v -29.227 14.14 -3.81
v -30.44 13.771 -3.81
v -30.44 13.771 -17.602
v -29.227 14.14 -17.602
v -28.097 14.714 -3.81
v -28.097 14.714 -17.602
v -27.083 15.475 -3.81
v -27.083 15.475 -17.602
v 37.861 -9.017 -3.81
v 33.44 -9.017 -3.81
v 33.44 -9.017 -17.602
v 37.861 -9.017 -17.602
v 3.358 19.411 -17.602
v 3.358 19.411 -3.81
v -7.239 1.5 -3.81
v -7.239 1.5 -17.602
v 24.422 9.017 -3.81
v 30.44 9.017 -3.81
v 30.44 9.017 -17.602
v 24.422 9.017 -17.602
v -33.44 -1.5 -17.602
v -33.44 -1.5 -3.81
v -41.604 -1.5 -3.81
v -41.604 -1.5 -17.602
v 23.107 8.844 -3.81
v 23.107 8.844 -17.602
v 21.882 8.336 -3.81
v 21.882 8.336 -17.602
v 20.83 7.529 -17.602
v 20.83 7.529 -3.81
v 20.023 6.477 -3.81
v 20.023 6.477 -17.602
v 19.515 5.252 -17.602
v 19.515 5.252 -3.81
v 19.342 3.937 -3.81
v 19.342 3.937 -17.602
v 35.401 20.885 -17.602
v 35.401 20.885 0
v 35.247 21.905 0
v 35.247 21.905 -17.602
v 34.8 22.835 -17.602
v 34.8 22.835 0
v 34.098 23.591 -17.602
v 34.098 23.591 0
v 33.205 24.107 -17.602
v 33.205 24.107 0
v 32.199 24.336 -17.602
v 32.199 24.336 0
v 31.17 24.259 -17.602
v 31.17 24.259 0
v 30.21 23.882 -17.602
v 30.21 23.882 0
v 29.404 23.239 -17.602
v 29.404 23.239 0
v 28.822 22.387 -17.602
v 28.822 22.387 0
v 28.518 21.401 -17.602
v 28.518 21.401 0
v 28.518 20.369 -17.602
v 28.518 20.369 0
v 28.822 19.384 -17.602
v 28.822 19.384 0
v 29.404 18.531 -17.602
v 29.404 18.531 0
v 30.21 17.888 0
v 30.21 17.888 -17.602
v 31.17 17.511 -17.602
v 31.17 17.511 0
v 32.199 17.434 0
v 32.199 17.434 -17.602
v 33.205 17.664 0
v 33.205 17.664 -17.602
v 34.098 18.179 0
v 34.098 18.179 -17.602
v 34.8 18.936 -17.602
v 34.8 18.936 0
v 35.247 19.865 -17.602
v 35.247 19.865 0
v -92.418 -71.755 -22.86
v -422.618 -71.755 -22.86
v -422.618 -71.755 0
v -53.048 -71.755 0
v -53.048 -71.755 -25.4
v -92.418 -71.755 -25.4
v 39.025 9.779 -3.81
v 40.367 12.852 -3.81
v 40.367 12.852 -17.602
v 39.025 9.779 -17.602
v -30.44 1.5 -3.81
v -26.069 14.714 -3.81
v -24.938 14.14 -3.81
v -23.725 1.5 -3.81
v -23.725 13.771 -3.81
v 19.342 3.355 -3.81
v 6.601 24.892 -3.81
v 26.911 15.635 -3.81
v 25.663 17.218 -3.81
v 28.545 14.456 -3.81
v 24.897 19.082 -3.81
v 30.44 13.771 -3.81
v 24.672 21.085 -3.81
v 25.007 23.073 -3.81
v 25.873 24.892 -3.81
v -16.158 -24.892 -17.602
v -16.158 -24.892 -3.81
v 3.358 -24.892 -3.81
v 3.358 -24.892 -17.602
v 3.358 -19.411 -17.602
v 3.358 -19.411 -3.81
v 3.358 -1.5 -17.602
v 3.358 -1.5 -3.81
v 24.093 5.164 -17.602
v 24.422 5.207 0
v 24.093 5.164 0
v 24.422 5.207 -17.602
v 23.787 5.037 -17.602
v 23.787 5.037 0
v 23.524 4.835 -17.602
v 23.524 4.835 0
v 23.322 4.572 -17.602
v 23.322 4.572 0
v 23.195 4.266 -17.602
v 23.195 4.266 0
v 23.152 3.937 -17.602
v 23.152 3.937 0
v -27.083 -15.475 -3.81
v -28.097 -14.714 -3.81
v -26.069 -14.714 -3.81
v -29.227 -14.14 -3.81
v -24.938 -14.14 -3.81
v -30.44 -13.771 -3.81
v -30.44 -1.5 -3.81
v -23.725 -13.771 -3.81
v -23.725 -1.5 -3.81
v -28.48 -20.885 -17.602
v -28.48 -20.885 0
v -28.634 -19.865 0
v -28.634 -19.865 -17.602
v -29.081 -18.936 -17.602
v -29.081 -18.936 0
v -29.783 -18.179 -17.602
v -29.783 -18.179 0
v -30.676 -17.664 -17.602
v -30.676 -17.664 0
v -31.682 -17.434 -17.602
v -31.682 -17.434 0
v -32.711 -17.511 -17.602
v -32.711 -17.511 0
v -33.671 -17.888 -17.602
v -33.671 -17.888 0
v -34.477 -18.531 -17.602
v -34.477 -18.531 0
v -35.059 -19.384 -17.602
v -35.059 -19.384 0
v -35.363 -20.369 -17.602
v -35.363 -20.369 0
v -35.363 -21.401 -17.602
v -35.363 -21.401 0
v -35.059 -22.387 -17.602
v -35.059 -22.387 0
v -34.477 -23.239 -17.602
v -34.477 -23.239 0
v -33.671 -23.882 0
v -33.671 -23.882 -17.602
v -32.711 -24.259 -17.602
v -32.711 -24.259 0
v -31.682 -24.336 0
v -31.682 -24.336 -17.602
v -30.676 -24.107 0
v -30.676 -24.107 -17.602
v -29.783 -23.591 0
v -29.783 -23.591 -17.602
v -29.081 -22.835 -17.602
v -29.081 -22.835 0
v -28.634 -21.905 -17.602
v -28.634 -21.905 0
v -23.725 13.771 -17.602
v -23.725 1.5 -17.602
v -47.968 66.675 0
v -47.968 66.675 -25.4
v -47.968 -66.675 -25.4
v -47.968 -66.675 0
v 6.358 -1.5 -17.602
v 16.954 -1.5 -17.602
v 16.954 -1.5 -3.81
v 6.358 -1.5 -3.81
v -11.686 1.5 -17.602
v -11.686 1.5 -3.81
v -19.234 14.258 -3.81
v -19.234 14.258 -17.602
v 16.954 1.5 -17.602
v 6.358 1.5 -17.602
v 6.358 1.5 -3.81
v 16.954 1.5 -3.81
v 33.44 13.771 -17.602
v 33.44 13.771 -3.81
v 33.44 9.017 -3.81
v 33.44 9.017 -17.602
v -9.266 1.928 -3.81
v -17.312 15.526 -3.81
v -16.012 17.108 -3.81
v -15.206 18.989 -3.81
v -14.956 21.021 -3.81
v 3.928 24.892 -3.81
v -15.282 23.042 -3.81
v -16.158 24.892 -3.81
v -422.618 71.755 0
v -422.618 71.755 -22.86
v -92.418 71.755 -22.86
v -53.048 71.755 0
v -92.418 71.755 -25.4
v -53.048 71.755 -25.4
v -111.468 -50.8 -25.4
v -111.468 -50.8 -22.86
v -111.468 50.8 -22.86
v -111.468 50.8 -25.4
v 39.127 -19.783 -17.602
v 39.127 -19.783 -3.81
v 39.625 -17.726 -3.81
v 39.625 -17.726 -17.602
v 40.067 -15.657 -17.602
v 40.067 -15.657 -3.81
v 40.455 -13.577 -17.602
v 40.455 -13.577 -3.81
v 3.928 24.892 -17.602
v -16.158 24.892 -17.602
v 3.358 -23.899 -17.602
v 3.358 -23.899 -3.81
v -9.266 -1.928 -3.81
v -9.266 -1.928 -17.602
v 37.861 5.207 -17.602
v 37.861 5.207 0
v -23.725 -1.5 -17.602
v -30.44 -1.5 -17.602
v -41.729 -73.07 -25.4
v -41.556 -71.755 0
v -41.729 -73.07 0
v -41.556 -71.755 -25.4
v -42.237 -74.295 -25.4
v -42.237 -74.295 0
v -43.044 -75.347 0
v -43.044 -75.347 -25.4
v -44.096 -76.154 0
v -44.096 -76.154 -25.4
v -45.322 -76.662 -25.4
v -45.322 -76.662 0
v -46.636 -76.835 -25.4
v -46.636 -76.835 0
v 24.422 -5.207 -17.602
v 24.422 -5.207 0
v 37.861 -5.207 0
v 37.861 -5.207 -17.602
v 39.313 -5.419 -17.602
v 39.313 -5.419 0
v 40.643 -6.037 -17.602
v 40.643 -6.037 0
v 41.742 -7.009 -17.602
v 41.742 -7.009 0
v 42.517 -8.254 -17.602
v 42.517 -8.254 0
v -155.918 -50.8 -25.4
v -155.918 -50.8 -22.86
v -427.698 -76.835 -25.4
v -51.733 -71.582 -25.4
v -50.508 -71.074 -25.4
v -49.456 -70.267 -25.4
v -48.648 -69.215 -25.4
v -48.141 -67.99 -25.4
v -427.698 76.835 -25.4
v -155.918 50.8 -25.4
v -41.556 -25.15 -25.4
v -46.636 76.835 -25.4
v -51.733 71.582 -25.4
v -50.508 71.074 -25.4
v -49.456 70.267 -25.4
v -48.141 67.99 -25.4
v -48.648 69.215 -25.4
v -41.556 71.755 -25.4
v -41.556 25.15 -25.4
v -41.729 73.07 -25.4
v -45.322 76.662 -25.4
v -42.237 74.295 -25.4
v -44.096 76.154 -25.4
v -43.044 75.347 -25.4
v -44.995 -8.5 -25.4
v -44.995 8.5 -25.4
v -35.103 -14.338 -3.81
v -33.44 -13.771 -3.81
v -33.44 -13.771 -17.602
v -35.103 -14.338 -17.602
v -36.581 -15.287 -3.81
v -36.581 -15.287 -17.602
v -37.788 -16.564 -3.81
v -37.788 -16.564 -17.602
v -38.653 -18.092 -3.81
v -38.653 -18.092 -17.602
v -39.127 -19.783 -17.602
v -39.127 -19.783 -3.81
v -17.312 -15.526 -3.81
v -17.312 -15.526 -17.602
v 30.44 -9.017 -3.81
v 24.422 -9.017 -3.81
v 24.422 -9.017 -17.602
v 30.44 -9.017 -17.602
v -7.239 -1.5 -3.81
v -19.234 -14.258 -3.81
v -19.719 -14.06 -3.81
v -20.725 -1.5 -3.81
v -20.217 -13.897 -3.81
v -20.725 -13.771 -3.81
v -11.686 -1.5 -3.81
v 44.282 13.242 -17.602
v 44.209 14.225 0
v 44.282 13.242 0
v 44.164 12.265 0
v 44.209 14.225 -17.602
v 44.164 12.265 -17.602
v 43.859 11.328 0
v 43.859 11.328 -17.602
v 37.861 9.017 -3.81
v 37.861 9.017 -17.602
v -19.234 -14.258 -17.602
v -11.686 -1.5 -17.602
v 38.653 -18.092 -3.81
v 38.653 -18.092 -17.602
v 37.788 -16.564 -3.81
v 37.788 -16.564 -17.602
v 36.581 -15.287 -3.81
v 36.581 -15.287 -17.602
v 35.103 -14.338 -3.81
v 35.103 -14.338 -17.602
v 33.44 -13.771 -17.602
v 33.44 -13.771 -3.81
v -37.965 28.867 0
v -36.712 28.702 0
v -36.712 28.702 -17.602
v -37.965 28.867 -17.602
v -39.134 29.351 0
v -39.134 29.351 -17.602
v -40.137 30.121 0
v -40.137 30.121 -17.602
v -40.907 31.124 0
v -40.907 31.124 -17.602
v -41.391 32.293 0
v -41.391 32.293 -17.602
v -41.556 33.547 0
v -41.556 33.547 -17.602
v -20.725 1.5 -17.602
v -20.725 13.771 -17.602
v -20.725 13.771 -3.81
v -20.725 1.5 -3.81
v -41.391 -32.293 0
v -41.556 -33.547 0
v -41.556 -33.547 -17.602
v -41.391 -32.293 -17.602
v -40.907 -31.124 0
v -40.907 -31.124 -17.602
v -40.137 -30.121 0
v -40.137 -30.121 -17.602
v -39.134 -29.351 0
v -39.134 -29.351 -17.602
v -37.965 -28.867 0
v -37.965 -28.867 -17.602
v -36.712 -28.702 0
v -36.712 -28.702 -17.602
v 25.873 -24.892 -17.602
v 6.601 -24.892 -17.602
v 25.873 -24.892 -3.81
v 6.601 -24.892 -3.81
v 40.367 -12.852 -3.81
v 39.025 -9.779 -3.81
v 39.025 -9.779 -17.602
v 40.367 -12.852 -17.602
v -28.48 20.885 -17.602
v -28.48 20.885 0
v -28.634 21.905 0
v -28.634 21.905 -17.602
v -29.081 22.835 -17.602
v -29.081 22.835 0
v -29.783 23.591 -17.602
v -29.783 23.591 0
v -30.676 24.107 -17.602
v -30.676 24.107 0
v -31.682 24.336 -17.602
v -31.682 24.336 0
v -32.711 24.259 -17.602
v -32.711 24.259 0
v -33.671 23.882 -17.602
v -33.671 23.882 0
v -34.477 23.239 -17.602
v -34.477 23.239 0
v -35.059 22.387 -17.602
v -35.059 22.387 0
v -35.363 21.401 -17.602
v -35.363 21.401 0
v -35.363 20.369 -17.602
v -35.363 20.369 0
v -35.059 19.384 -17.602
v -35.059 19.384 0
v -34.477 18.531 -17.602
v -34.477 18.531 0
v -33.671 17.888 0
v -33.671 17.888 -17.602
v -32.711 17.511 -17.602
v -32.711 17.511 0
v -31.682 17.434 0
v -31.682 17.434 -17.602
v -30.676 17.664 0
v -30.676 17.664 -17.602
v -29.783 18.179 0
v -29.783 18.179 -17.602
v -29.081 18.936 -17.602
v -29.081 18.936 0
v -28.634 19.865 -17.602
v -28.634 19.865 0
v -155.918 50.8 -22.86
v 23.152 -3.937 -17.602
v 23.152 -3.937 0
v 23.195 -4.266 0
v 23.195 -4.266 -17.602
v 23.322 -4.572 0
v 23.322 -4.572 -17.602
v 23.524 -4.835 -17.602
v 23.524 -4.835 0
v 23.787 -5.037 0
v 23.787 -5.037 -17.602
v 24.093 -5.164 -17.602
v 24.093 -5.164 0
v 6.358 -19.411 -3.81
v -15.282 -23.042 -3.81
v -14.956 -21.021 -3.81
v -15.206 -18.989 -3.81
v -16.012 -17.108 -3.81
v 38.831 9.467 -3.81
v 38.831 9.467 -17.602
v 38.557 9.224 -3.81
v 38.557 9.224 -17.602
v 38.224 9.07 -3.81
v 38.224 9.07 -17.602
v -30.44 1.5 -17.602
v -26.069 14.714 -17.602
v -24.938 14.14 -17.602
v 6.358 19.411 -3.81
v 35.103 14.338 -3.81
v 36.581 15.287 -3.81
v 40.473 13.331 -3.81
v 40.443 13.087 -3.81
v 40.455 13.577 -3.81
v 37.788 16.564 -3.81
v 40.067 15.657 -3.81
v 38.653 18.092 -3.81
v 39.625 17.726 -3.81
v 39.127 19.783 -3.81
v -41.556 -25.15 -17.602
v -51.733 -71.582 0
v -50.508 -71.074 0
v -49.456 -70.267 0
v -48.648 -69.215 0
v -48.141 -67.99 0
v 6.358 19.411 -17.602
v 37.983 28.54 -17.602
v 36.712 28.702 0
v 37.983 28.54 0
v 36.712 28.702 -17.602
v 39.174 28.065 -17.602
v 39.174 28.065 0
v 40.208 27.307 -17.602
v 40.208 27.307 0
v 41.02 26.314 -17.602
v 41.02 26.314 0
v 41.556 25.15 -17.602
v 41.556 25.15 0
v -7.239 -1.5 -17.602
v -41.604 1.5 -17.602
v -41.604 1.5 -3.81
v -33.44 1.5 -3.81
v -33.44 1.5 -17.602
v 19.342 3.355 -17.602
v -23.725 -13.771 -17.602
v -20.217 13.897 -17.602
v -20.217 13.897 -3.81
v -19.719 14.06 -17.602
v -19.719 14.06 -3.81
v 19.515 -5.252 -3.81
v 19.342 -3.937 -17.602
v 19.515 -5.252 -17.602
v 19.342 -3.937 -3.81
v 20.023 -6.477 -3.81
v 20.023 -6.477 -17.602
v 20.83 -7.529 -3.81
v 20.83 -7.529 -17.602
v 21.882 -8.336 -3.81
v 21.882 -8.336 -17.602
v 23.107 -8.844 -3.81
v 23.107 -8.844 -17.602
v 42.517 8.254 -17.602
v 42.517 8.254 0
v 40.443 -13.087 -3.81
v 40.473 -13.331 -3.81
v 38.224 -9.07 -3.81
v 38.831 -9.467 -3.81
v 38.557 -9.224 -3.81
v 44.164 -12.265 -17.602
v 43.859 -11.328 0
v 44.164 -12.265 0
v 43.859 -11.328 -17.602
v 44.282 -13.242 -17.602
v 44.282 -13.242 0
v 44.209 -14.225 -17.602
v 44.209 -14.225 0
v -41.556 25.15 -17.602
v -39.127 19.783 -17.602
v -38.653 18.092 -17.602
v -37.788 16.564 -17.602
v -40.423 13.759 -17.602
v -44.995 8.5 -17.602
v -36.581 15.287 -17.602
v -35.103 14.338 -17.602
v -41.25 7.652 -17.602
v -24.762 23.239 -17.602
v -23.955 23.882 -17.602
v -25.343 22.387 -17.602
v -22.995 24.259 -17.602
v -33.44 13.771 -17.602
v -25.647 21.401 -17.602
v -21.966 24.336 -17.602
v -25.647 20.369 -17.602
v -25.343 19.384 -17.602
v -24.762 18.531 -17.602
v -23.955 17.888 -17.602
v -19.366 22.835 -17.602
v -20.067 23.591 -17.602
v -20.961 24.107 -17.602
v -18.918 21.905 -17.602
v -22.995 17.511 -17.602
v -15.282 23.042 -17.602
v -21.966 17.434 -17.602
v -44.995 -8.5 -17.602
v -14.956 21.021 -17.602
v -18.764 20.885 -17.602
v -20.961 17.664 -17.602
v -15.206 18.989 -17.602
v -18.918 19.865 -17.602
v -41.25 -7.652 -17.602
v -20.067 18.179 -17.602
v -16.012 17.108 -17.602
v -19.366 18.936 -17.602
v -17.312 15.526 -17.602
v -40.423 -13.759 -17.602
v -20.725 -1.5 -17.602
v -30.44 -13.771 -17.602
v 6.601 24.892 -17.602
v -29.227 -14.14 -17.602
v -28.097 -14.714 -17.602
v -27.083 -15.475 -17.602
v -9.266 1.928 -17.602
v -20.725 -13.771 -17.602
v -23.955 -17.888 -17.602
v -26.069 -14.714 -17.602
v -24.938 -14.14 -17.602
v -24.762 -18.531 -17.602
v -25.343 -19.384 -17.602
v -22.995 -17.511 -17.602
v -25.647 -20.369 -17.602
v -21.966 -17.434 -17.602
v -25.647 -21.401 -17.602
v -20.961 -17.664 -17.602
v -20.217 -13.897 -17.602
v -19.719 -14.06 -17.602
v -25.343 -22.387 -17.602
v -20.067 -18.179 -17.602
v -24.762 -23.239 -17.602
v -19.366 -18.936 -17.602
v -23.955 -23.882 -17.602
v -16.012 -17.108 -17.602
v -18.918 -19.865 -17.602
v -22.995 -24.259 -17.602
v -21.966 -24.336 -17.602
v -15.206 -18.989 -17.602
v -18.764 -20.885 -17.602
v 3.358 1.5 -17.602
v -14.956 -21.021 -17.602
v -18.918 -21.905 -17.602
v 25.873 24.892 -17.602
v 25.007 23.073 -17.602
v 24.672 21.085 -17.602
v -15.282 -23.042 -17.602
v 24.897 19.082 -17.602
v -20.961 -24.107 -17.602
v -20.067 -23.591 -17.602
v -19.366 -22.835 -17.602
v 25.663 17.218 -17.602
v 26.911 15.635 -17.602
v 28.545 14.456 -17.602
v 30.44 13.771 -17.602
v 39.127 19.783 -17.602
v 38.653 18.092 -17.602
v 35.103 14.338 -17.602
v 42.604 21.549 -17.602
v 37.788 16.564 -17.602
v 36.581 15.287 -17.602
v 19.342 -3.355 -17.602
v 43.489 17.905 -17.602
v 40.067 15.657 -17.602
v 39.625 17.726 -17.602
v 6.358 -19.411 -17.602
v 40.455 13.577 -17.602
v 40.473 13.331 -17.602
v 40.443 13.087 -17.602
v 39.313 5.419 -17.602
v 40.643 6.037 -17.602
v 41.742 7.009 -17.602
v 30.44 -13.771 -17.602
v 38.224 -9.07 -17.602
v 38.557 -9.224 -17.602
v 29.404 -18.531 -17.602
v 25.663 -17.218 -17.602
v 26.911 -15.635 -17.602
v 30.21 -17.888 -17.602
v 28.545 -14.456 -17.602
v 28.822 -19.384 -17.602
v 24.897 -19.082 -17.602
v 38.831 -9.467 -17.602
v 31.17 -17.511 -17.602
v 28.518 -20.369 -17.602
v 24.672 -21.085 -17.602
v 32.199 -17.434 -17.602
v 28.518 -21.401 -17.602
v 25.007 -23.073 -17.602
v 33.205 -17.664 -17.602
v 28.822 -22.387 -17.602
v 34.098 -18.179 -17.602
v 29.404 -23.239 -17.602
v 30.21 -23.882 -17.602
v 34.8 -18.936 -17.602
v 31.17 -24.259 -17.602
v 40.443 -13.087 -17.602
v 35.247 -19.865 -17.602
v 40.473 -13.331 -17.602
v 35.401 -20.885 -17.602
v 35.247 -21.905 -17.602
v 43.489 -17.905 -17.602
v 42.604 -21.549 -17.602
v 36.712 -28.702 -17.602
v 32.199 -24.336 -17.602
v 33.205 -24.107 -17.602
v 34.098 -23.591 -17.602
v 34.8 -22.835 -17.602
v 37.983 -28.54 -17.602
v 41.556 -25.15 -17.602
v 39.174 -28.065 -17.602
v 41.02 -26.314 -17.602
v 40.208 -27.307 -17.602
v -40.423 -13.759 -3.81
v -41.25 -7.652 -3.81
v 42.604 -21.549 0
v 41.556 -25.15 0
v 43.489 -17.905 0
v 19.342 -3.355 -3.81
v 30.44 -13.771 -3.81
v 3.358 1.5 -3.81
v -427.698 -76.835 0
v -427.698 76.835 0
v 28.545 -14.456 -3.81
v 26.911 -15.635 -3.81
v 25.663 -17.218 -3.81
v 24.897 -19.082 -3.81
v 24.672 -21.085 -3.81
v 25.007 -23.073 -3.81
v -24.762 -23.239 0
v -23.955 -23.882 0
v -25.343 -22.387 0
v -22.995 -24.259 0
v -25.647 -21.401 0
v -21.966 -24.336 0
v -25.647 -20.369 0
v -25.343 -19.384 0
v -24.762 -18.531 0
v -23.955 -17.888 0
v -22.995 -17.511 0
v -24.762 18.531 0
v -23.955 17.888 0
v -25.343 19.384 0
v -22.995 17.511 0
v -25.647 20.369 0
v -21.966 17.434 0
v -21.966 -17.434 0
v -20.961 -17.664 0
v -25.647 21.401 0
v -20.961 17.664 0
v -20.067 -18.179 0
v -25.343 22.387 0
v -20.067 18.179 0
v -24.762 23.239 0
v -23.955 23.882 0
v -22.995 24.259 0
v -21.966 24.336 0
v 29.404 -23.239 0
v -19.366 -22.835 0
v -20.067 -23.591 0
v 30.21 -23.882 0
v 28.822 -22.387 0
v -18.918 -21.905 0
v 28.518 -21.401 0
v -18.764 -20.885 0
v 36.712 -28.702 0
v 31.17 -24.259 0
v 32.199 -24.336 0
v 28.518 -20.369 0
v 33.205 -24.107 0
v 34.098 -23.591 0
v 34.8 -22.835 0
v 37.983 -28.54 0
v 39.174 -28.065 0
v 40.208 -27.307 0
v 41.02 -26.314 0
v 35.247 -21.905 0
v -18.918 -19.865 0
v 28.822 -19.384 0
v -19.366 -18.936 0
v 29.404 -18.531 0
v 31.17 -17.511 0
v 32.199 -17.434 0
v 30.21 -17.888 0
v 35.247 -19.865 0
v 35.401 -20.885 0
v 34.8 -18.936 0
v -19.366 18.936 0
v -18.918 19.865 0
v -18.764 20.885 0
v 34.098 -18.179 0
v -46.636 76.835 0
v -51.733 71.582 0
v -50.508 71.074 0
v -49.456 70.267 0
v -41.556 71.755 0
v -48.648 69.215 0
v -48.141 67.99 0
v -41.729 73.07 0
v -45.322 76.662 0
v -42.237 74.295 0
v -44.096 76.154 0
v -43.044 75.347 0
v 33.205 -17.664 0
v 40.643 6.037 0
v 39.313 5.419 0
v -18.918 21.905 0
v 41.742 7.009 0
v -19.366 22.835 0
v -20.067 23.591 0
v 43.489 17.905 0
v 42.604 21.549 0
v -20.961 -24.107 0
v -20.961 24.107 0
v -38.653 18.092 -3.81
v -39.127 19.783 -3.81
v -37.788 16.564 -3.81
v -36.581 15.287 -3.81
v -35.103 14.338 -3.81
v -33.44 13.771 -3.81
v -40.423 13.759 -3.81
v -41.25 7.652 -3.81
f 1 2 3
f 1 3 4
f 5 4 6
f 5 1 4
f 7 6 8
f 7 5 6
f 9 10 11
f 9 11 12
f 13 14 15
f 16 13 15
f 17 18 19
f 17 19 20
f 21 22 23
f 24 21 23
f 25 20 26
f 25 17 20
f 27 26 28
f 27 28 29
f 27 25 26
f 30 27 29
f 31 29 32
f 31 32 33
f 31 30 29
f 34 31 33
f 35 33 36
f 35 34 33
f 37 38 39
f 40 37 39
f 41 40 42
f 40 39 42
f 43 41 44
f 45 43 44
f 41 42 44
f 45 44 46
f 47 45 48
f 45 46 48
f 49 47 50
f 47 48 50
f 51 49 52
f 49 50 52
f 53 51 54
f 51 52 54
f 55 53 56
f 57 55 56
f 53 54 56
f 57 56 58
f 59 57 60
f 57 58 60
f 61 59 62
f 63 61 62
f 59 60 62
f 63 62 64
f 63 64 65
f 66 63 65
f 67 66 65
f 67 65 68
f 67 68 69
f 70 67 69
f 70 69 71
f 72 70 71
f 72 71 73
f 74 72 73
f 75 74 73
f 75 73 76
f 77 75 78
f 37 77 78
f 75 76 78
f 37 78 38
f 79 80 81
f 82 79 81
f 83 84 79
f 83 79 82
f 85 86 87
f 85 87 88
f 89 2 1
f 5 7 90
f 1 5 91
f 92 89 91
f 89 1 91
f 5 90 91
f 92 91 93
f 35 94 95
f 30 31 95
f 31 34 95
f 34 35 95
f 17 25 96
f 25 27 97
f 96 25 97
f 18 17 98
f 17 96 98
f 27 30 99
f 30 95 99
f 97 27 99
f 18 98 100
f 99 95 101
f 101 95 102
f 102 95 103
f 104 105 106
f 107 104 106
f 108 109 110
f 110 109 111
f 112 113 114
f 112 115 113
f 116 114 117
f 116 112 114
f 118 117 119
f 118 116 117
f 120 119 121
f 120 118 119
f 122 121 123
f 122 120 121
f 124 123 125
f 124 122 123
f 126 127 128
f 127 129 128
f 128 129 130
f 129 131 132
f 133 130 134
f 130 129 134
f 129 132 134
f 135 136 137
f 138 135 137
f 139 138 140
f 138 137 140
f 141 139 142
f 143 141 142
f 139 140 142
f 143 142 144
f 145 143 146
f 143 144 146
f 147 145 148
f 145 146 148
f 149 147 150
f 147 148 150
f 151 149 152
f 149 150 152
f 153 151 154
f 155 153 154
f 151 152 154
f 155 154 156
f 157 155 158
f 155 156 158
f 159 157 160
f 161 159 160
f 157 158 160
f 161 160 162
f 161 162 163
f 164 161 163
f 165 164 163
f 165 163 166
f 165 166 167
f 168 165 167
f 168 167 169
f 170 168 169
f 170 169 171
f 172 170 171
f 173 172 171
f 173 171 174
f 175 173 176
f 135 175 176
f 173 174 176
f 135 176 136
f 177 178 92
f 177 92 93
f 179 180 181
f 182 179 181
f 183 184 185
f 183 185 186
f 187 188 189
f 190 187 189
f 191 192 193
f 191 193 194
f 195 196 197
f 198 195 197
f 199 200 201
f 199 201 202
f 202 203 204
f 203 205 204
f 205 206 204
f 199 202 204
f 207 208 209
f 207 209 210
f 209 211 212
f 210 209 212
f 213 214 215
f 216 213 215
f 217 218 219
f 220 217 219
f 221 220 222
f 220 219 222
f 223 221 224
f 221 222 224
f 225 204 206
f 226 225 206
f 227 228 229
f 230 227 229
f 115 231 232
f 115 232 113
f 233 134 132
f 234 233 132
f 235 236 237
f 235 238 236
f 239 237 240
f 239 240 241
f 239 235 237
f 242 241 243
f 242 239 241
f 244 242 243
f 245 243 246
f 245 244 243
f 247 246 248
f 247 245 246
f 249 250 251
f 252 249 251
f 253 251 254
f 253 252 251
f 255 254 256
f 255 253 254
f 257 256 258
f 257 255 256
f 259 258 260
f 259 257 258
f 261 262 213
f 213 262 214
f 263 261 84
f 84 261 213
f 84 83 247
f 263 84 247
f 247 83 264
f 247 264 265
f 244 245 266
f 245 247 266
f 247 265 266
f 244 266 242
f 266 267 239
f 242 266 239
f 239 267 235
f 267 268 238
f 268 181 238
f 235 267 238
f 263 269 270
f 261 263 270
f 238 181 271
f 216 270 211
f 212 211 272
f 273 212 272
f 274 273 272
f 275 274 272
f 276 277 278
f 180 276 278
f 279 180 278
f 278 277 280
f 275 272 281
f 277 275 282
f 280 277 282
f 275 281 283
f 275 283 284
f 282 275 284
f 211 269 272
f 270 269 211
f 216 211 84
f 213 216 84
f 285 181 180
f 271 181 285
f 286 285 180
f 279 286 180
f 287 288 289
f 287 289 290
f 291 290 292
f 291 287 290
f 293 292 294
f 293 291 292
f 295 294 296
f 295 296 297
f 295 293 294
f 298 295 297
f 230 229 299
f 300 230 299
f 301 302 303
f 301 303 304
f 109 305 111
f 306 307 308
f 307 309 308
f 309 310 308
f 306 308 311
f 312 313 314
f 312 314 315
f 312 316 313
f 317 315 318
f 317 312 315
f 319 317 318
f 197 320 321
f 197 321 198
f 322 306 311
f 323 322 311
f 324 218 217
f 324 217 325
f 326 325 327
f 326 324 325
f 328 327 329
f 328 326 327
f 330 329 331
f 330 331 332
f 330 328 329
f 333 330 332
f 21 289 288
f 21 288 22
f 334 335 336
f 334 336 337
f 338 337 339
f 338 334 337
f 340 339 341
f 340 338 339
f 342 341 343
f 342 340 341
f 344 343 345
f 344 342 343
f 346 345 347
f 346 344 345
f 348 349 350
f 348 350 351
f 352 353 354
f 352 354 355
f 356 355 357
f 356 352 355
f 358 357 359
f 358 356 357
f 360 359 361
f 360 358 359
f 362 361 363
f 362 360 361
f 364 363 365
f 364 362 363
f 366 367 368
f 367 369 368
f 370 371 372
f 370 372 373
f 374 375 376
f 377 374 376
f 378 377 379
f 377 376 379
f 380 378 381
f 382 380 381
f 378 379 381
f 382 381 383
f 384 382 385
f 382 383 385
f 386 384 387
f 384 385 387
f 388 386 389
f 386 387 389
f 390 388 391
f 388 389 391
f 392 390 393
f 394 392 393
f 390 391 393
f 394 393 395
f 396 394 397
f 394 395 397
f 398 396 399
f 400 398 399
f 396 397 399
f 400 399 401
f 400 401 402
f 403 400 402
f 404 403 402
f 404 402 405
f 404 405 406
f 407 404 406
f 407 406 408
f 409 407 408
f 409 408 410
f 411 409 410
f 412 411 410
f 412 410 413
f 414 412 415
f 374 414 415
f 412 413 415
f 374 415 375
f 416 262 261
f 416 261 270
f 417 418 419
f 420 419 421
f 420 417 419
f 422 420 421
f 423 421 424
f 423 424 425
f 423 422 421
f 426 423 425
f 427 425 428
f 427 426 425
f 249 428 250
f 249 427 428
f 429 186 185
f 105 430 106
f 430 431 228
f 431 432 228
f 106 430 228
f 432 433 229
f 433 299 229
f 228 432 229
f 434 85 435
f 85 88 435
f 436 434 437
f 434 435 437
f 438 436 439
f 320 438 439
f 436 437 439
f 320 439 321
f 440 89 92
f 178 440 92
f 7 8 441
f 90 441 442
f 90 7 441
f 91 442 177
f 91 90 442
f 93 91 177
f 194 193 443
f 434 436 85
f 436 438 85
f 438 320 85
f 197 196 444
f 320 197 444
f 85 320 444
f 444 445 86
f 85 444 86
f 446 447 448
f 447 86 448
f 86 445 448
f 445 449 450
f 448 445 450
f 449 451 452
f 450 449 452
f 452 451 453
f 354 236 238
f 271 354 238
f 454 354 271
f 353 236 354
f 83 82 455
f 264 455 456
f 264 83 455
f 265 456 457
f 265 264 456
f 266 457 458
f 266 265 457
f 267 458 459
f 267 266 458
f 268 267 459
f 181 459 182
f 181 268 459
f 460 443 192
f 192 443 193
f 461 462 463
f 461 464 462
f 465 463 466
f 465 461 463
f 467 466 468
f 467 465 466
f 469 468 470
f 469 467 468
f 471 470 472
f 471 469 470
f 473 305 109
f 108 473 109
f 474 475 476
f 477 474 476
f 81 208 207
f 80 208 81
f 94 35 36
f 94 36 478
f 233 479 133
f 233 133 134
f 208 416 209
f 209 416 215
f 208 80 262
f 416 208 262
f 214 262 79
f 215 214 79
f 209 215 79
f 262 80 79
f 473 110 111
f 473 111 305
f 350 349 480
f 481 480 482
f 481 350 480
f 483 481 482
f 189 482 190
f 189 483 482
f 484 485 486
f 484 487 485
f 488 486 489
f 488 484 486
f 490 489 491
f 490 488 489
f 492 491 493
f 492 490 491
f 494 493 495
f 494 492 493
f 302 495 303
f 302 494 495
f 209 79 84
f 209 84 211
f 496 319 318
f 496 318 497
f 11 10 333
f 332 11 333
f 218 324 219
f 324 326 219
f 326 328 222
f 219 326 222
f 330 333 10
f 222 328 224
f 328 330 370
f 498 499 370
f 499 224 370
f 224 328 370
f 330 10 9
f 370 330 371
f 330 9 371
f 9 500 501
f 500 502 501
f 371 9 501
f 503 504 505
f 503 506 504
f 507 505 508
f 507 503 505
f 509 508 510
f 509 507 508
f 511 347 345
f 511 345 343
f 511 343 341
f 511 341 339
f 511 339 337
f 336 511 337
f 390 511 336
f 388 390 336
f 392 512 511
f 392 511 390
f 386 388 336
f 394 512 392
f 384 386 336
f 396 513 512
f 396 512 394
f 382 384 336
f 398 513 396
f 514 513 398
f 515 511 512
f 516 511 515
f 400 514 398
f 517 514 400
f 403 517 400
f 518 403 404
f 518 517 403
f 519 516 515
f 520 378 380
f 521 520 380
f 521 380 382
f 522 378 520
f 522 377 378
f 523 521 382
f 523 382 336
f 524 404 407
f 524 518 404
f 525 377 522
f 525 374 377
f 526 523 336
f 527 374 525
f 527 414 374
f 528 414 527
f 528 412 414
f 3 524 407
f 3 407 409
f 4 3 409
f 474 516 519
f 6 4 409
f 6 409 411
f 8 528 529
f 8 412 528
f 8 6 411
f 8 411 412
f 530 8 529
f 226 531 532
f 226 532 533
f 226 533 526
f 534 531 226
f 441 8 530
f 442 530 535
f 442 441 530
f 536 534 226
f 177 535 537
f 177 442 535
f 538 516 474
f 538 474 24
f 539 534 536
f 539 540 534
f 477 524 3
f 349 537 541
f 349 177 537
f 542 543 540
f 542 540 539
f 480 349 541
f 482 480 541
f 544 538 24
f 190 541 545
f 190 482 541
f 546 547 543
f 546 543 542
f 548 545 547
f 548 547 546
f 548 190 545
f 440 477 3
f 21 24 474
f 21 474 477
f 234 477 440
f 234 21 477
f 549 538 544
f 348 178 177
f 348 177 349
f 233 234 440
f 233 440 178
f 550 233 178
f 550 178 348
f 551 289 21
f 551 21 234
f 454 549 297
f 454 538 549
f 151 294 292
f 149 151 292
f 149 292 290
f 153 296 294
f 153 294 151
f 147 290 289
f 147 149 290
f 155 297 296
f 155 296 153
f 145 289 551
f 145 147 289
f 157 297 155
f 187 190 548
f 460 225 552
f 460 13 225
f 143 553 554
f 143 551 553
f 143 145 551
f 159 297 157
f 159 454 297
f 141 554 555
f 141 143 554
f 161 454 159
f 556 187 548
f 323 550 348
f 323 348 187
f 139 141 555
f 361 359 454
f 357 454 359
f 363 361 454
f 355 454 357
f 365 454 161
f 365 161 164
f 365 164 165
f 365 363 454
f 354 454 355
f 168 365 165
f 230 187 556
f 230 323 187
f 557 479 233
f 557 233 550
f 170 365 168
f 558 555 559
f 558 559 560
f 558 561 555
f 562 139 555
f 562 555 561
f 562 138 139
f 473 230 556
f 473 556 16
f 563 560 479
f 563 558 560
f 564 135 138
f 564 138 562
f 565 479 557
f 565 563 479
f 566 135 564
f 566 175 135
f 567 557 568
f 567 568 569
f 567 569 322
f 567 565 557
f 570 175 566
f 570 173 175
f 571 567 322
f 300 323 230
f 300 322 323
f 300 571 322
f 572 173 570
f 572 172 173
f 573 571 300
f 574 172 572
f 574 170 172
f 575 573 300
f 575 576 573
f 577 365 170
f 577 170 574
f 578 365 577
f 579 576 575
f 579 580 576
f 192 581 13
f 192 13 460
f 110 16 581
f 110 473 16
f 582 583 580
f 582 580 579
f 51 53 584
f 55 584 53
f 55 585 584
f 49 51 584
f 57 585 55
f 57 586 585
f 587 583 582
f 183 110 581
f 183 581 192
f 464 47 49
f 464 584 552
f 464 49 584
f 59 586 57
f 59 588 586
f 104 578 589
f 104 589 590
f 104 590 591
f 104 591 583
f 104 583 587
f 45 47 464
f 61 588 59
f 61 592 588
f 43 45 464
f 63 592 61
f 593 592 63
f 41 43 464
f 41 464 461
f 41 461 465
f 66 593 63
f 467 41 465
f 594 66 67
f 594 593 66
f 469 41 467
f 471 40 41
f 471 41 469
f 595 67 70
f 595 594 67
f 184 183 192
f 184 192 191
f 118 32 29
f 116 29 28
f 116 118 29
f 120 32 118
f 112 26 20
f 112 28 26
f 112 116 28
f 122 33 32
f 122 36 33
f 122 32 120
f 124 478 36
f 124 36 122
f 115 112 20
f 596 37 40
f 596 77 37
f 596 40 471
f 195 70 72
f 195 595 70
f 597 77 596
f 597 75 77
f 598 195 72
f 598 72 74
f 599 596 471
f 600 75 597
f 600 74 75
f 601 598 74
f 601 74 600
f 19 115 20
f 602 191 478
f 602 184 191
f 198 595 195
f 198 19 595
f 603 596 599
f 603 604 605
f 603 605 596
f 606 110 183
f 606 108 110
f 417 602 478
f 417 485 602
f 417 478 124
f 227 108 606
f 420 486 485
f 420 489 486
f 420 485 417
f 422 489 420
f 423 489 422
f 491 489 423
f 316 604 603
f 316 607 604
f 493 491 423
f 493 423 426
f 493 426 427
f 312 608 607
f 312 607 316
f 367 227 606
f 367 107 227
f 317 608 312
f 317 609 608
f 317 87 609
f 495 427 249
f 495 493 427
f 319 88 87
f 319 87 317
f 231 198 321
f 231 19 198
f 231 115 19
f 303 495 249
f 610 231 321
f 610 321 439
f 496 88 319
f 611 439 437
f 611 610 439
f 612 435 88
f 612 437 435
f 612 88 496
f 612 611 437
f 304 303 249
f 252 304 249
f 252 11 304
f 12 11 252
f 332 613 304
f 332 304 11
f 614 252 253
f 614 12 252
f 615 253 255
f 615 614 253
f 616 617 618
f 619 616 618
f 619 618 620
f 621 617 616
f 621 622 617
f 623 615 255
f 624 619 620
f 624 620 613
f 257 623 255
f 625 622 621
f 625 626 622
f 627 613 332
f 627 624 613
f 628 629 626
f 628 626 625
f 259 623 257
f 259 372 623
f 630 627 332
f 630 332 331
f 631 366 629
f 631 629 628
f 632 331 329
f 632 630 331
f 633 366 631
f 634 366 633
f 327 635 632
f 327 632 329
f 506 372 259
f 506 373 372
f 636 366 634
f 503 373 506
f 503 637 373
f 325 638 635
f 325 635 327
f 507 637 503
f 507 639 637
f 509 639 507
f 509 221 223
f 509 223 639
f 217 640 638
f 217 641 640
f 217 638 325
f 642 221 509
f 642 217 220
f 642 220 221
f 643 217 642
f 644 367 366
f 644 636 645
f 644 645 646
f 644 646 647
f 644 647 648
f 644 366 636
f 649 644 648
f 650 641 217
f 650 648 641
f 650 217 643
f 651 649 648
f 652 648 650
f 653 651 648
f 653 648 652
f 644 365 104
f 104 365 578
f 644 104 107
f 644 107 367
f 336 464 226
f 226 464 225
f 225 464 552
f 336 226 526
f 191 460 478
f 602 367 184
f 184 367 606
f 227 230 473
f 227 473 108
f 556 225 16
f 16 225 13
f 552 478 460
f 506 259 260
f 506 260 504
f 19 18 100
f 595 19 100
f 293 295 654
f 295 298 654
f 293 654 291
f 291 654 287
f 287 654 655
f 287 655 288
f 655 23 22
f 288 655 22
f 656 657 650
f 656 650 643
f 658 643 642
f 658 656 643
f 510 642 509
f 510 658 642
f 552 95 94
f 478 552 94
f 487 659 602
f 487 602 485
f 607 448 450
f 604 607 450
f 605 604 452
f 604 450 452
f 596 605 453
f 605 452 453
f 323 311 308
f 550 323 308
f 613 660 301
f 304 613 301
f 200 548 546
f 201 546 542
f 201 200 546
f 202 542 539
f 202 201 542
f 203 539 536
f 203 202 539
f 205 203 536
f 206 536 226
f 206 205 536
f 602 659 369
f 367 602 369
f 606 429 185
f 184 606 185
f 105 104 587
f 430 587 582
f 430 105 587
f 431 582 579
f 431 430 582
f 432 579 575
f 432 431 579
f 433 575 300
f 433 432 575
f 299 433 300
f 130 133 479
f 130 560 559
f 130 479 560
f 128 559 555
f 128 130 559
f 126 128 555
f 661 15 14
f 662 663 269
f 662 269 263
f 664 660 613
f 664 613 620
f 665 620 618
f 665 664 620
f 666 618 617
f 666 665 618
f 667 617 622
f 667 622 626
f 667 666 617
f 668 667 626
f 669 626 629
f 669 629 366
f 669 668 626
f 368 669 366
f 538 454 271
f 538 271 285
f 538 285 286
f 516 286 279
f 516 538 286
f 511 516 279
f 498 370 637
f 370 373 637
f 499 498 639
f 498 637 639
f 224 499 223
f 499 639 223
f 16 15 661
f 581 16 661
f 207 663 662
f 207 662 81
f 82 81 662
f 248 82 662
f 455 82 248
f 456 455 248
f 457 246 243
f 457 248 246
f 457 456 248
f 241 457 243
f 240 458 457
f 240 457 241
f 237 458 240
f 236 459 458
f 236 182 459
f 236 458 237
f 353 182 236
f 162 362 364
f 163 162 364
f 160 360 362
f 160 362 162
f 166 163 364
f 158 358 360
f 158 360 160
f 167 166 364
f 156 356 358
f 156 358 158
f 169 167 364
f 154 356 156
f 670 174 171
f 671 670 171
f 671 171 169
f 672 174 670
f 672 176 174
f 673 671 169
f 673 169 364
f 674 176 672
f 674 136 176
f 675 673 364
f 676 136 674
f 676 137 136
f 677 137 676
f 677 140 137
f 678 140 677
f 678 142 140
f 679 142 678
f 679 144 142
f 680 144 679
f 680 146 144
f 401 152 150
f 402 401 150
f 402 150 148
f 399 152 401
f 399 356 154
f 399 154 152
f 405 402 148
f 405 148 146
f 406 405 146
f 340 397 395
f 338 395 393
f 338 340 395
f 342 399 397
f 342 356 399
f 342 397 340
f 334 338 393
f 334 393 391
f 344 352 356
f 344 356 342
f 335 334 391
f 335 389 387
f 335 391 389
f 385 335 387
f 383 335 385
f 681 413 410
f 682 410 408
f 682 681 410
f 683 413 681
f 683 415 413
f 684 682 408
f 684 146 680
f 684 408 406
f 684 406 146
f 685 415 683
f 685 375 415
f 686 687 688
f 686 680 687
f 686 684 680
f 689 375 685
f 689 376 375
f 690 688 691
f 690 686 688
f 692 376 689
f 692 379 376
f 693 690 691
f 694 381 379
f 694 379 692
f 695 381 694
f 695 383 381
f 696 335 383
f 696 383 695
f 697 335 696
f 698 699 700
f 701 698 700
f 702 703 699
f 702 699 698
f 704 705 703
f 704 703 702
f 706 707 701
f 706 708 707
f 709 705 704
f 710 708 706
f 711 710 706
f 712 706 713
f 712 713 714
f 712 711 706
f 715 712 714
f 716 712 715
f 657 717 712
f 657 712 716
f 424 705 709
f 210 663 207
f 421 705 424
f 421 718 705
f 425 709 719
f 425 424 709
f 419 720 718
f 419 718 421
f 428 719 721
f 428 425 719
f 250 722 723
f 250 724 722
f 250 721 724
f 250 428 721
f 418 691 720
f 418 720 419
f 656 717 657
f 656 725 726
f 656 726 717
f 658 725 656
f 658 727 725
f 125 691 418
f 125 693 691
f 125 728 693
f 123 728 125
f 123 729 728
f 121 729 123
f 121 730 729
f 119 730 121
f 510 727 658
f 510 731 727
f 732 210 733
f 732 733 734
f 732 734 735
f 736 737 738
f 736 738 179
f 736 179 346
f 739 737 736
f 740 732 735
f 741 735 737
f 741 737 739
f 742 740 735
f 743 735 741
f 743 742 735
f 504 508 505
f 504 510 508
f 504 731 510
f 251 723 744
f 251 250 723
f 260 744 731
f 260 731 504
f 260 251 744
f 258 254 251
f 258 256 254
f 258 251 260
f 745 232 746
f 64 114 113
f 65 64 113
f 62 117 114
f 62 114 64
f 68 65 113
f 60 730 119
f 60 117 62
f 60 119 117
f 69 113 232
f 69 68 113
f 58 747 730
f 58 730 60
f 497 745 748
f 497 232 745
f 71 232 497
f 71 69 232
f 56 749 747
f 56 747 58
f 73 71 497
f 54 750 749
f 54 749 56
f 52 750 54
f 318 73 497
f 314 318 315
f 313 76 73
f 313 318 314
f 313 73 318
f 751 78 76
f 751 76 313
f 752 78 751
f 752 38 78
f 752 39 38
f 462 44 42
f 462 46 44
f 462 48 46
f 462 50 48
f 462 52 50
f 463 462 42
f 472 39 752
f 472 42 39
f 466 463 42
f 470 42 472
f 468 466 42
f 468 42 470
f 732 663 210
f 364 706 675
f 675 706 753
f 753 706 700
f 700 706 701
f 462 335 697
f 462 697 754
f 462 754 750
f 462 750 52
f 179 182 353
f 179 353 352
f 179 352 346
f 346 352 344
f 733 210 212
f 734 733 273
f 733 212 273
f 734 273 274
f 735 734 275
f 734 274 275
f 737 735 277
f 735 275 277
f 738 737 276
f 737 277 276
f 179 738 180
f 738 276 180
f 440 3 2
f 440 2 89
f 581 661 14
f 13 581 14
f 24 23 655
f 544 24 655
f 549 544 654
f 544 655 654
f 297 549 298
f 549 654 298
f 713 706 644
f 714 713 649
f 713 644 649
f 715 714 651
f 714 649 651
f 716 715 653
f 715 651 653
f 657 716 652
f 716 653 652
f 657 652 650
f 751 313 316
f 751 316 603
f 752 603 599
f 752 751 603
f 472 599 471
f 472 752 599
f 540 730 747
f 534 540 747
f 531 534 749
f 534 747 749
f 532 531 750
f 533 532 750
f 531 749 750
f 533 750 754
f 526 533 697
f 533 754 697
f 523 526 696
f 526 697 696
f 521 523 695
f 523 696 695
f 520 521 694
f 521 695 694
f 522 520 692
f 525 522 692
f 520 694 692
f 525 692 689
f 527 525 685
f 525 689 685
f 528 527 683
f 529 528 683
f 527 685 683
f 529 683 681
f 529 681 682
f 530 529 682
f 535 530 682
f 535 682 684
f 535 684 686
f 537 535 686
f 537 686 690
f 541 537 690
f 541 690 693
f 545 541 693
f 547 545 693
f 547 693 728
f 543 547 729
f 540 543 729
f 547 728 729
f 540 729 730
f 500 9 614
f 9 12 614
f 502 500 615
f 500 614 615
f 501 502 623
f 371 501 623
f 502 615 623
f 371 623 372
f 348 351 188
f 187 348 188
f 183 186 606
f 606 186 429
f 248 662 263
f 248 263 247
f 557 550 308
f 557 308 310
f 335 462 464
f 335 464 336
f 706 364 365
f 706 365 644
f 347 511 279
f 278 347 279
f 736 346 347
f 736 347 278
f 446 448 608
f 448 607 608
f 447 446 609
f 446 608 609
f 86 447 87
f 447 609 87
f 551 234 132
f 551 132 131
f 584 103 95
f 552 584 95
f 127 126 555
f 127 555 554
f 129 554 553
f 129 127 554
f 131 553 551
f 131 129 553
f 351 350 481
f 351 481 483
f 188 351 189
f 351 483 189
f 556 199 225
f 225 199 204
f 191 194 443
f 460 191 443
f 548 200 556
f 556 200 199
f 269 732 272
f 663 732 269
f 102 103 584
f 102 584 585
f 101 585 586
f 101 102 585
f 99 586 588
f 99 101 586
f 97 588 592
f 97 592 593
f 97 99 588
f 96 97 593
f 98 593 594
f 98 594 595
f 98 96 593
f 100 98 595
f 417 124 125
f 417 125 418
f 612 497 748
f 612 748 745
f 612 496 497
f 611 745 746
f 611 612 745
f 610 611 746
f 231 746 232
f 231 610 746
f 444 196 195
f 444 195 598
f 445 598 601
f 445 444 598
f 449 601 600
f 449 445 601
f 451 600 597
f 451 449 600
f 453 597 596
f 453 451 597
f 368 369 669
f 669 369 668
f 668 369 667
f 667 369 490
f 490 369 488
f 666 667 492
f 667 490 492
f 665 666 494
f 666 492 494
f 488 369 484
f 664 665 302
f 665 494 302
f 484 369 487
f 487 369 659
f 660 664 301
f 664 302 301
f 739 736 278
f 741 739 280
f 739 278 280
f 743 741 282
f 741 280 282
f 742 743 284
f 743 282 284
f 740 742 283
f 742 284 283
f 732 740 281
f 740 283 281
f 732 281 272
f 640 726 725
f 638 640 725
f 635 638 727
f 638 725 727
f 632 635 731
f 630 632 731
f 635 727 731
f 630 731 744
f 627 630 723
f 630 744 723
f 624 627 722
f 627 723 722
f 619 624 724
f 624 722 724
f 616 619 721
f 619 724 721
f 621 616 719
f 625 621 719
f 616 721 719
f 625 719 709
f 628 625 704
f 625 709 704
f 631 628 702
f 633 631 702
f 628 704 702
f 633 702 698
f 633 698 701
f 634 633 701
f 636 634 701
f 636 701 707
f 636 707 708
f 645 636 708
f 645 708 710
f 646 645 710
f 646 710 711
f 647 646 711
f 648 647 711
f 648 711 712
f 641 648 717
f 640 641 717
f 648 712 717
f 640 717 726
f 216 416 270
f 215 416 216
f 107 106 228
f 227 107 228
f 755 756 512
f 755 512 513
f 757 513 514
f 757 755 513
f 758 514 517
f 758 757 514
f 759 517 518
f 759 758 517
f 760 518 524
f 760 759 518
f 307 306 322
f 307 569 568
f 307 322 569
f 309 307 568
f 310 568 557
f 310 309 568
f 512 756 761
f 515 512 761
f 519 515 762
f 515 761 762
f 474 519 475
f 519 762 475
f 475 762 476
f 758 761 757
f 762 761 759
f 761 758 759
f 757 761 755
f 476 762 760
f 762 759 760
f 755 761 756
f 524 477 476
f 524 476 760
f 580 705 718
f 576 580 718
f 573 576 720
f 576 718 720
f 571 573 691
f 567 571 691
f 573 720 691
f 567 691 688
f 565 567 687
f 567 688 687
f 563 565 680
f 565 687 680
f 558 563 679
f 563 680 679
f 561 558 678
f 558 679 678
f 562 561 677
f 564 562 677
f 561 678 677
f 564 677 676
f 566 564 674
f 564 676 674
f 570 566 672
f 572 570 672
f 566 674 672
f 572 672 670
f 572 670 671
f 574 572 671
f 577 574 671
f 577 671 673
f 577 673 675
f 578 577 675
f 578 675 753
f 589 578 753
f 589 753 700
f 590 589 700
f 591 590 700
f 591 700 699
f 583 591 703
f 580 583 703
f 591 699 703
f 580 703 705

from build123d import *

# Parameters (mm, degrees)
F0_R      = 3.46075
F1_DEPTH  = 17.6022
F3_DEPTH  = 17.6032
F4_R      = 5.08
F5_T      = -3.81
F6_R      = 1.27
F7_R      = 5.08
F9_DEPTH  = 13.7922
F10_DEPTH = 13.7922
F11_W     = 3
F11_H     = 26.392
F12_DEPTH = 13.7922
F14_DEPTH = 25.4
F17_DEPTH = 25.4
F19_START = -2.54
F18_W     = 374.65
F18_H     = 143.51
F19_DEPTH = 22.861
F20_W     = 44.45
F20_H     = 143.51
F21_DEPTH = 25.401
F22_W     = 44.45
F22_H     = 101.6
F23_DEPTH = 2.541
F24_R     = 5.08


with BuildPart() as f1:
    # F0 (on Top) → F1 (new body)
    with BuildSketch(Plane.XY):
        with BuildLine():
            Line((40.3479, 28.702), (-40.3479, 28.702))
            ThreePointArc((-40.3479, 28.702), (-44.1481068354, 14.5740454576), (-45.4279, 0))
            ThreePointArc((-45.4279, 0), (-44.1481068354, -14.5740454576), (-40.3479, -28.702))
            Line((-40.3479, -28.702), (40.3479, -28.702))
            ThreePointArc((40.3479, -28.702), (44.1481068354, -14.5740454576), (45.4279, 0))
            ThreePointArc((45.4279, 0), (44.1481068354, 14.5740454576), (40.3479, 28.702))
        make_face()
        with Locations((-31.9405, -20.88515)):
            Circle(F0_R, mode=Mode.SUBTRACT)
        with Locations((-22.225, -20.88515)):
            Circle(F0_R, mode=Mode.SUBTRACT)
        with Locations((31.9405, -20.88515)):
            Circle(F0_R, mode=Mode.SUBTRACT)
        with Locations((-31.9405, 20.88515)):
            Circle(F0_R, mode=Mode.SUBTRACT)
        with Locations((-22.225, 20.88515)):
            Circle(F0_R, mode=Mode.SUBTRACT)
        with Locations((31.9405, 20.88515)):
            Circle(F0_R, mode=Mode.SUBTRACT)
    extrude(amount=-F1_DEPTH)

    # F2 (on face) → F3 (cut, through all)
    with BuildSketch(Plane.XY):
        with BuildLine():
            Line((41.1861, -5.207), (44.4578879678, -12.7))
            ThreePointArc((44.4578879678, -12.7), (45.4279, 0), (44.4578879678, 12.7))
            Line((44.4578879678, 12.7), (41.1861, 5.207))
            Line((41.1861, 5.207), (23.1521, 5.207))
            Line((23.1521, 5.207), (23.1521, -5.207))
            Line((23.1521, -5.207), (41.1861, -5.207))
        make_face()
    extrude(amount=-F3_DEPTH, mode=Mode.SUBTRACT)

    # F4
    f4_edges = [f1.edges().sort_by_distance(p)[0] for p in [
        (40.3479, -28.702, -8.8011),
        (-40.3479, -28.702, -8.8011),
        (44.457888, -12.7, -8.8011),
        (41.1861, 5.207, -8.8011),
        (44.457888, 12.7, -8.8011),
        (40.3479, 28.702, -8.8011),
        (41.1861, -5.207, -8.8011),
        (-40.3479, 28.702, -8.8011),
    ]]
    fillet(f4_edges, radius=F4_R)

    # F5
    f5_openings = [f1.faces().sort_by_distance(p)[0] for p in [
        (-1.726603, 0, -17.6022),
    ]]
    offset(amount=F5_T, openings=f5_openings, kind=Kind.INTERSECTION)

    # F6
    f6_edges = [f1.edges().sort_by_distance(p)[0] for p in [
        (23.1521, -5.207, -8.8011),
        (23.1521, 5.207, -8.8011),
    ]]
    fillet(f6_edges, radius=F6_R)

    # F7
    f7_edges = [f1.edges().sort_by_distance(p)[0] for p in [
        (19.3421, 9.017, -10.7061),
        (19.3421, -9.017, -10.7061),
    ]]
    fillet(f7_edges, radius=F7_R)

    # F8 (on face) → F9 (join, through all)
    with BuildSketch(Plane(origin=(0, 0, -3.81), x_dir=(1, 0, 0), z_dir=(0, 0, -1))):
        with BuildLine():
            ThreePointArc((-30.4405, 13.770811973), (-31.9405, 13.6144), (-33.4405, 13.770811973))
            Line((-33.4405, 13.770811973), (-33.4405, 1.5))
            Line((-33.4405, 1.5), (-41.6038033335, 1.5))
            ThreePointArc((-41.6038033335, 1.5), (-41.6179, 0), (-41.6038033335, -1.5))
            Line((-41.6038033335, -1.5), (-33.4405, -1.5))
            Line((-33.4405, -1.5), (-33.4405, -13.770811973))
            ThreePointArc((-33.4405, -13.770811973), (-31.9405, -13.6144), (-30.4405, -13.770811973))
            Line((-30.4405, -13.770811973), (-30.4405, -1.5))
            Line((-30.4405, -1.5), (-23.725, -1.5))
            Line((-23.725, -1.5), (-23.725, -13.770811973))
            ThreePointArc((-23.725, -13.770811973), (-22.225, -13.6144), (-20.725, -13.770811973))
            Line((-20.725, -13.770811973), (-20.725, -1.5))
            Line((-20.725, -1.5), (-11.6858483937, -1.5))
            Line((-11.6858483937, -1.5), (-19.2338569272, -14.2581696408))
            ThreePointArc((-19.2338569272, -14.2581696408), (-18.2221749105, -14.8154550435), (-17.3115079246, -15.5259148691))
            Line((-17.3115079246, -15.5259148691), (-9.2664339883, -1.9275706705))
            Line((-9.2664339883, -1.9275706705), (3.9282284547, -24.892))
            Line((3.9282284547, -24.892), (6.6006028975, -24.892))
            Line((6.6006028975, -24.892), (19.3421, -3.3554343231))
            Line((19.3421, -3.3554343231), (19.3421, 3.3554343231))
            Line((19.3421, 3.3554343231), (6.6006028975, 24.892))
            Line((6.6006028975, 24.892), (3.9282284547, 24.892))
            Line((3.9282284547, 24.892), (-9.2664339883, 1.9275706705))
            Line((-9.2664339883, 1.9275706705), (-17.3115079246, 15.5259148691))
            ThreePointArc((-17.3115079246, 15.5259148691), (-18.2221749105, 14.8154550435), (-19.2338569272, 14.2581696408))
            Line((-19.2338569272, 14.2581696408), (-11.6858483937, 1.5))
            Line((-11.6858483937, 1.5), (-20.725, 1.5))
            Line((-20.725, 1.5), (-20.725, 13.770811973))
            ThreePointArc((-20.725, 13.770811973), (-22.225, 13.6144), (-23.725, 13.770811973))
            Line((-23.725, 13.770811973), (-23.725, 1.5))
            Line((-23.725, 1.5), (-30.4405, 1.5))
            Line((-30.4405, 1.5), (-30.4405, 13.770811973))
        make_face()
        Polygon((16.9541091985, -1.5), (4.85775, -21.9461086663), (-7.2386091985, -1.5), align=None, mode=Mode.SUBTRACT)
        Polygon((-7.2386091985, 1.5), (4.85775, 21.9461086663), (16.9541091985, 1.5), align=None, mode=Mode.SUBTRACT)
    extrude(amount=F9_DEPTH)

    # F8 (on face) → F10 (join, through all)
    with BuildSketch(Plane(origin=(0, 0, -3.81), x_dir=(1, 0, 0), z_dir=(0, 0, -1))):
        with BuildLine():
            ThreePointArc((33.4405, 13.770811973), (31.9405, 13.6144), (30.4405, 13.770811973))
            Line((30.4405, 13.770811973), (30.4405, 9.017))
            Line((30.4405, 9.017), (33.4405, 9.017))
            Line((33.4405, 9.017), (33.4405, 13.770811973))
        make_face()
        with BuildLine():
            Line((30.4405, -9.017), (30.4405, -13.770811973))
            ThreePointArc((30.4405, -13.770811973), (31.9405, -13.6144), (33.4405, -13.770811973))
            Line((33.4405, -13.770811973), (33.4405, -9.017))
            Line((33.4405, -9.017), (30.4405, -9.017))
        make_face()
    extrude(amount=F10_DEPTH)

    # F11 (on face) → F12 (join, through all)
    with BuildSketch(Plane(origin=(0, 0, -3.81), x_dir=(1, 0, 0), z_dir=(0, 0, -1))):
        Polygon((4.85775, -21.9461086663), (6.35775, -19.4107042115), (6.35775, -1.5), (3.35775, -1.5), (3.35775, -19.4107042115), align=None)
        with Locations((4.85775, 11.696)):
            Rectangle(F11_W, F11_H)
    extrude(amount=F12_DEPTH)


with BuildPart() as f14:
    # F13 (on Top) → F14 (new body)
    with BuildSketch(Plane.XY):
        with BuildLine():
            Line((-427.6979, -76.835), (-41.5563505644, -76.835))
            Line((-41.5563505644, -76.835), (-41.5563505644, -33.5468082961))
            ThreePointArc((-41.5563505644, -33.5468082961), (-40.137339068, -30.1210114964), (-36.7115422683, -28.702))
            ThreePointArc((-36.7115422683, -28.702), (-39.7152963104, -27.7188111568), (-41.5563505644, -25.1498195489))
            ThreePointArc((-41.5563505644, -25.1498195489), (-45.4279, 0), (-41.5563505644, 25.1498195489))
            ThreePointArc((-41.5563505644, 25.1498195489), (-39.7152963104, 27.7188111568), (-36.7115422683, 28.702))
            ThreePointArc((-36.7115422683, 28.702), (-40.137339068, 30.1210114964), (-41.5563505644, 33.5468082961))
            Line((-41.5563505644, 33.5468082961), (-41.5563505644, 76.835))
            Line((-41.5563505644, 76.835), (-427.6979, 76.835))
            Line((-427.6979, 76.835), (-427.6979, -76.835))
        make_face()
    extrude(amount=-F14_DEPTH)

    # F15: union F1
    add(f1.part)

    # F16 (on face) → F17 (cut)
    with BuildSketch(Plane(origin=(0, 0, -17.6022), x_dir=(1, 0, 0), z_dir=(0, 0, -1))):
        with BuildLine():
            ThreePointArc((-36.7115422683, -28.702), (-39.7152963104, -27.7188111568), (-41.5563505644, -25.1498195489))
            Line((-41.5563505644, -25.1498195489), (-41.5563505644, -33.5468082961))
            Line((-41.5563505644, -33.5468082961), (38.19525, -33.5468082961))
            Line((38.19525, -33.5468082961), (38.19525, -28.48049888))
            ThreePointArc((38.19525, -28.48049888), (37.4616174944, -28.6463195714), (36.7115422683, -28.702))
            Line((36.7115422683, -28.702), (-36.7115422683, -28.702))
        make_face()
        with BuildLine():
            Line((38.19525, 33.5468082961), (-41.5563505644, 33.5468082961))
            Line((-41.5563505644, 33.5468082961), (-41.5563505644, 25.1498195489))
            ThreePointArc((-41.5563505644, 25.1498195489), (-39.7152963104, 27.7188111568), (-36.7115422683, 28.702))
            Line((-36.7115422683, 28.702), (36.7115422683, 28.702))
            ThreePointArc((36.7115422683, 28.702), (37.4616174944, 28.6463195714), (38.19525, 28.48049888))
            Line((38.19525, 28.48049888), (38.19525, 33.5468082961))
        make_face()
    extrude(amount=F17_DEPTH, mode=Mode.SUBTRACT)

    # F18 (on face) → F19 (cut)
    with BuildSketch(Plane(origin=(0, 0, -25.4), x_dir=(1, 0, 0), z_dir=(0, 0, -1)).offset(F19_START)):
        with Locations((-235.2929, 0)):
            Rectangle(F18_W, F18_H)
    extrude(amount=-F19_DEPTH, mode=Mode.SUBTRACT)

    # F20 (on face) → F21 (cut, through all)
    with BuildSketch(Plane.XY):
        with Locations((-70.1929, 0)):
            Rectangle(F20_W, F20_H)
    extrude(amount=-F21_DEPTH, mode=Mode.SUBTRACT)

    # F22 (on face) → F23 (cut, through all)
    with BuildSketch(Plane.XY.offset(-22.86)):
        with Locations((-133.6929, 0)):
            Rectangle(F22_W, F22_H)
    extrude(amount=-F23_DEPTH, mode=Mode.SUBTRACT)

    # F24
    f24_edges = [f14.edges().sort_by_distance(p)[0] for p in [
        (-41.556351, -76.835, -12.7),
        (-41.556351, 76.835, -12.7),
        (-47.9679, 71.755, -12.7),
        (-47.9679, -71.755, -12.7),
    ]]
    fillet(f24_edges, radius=F24_R)


solid = f14.part
